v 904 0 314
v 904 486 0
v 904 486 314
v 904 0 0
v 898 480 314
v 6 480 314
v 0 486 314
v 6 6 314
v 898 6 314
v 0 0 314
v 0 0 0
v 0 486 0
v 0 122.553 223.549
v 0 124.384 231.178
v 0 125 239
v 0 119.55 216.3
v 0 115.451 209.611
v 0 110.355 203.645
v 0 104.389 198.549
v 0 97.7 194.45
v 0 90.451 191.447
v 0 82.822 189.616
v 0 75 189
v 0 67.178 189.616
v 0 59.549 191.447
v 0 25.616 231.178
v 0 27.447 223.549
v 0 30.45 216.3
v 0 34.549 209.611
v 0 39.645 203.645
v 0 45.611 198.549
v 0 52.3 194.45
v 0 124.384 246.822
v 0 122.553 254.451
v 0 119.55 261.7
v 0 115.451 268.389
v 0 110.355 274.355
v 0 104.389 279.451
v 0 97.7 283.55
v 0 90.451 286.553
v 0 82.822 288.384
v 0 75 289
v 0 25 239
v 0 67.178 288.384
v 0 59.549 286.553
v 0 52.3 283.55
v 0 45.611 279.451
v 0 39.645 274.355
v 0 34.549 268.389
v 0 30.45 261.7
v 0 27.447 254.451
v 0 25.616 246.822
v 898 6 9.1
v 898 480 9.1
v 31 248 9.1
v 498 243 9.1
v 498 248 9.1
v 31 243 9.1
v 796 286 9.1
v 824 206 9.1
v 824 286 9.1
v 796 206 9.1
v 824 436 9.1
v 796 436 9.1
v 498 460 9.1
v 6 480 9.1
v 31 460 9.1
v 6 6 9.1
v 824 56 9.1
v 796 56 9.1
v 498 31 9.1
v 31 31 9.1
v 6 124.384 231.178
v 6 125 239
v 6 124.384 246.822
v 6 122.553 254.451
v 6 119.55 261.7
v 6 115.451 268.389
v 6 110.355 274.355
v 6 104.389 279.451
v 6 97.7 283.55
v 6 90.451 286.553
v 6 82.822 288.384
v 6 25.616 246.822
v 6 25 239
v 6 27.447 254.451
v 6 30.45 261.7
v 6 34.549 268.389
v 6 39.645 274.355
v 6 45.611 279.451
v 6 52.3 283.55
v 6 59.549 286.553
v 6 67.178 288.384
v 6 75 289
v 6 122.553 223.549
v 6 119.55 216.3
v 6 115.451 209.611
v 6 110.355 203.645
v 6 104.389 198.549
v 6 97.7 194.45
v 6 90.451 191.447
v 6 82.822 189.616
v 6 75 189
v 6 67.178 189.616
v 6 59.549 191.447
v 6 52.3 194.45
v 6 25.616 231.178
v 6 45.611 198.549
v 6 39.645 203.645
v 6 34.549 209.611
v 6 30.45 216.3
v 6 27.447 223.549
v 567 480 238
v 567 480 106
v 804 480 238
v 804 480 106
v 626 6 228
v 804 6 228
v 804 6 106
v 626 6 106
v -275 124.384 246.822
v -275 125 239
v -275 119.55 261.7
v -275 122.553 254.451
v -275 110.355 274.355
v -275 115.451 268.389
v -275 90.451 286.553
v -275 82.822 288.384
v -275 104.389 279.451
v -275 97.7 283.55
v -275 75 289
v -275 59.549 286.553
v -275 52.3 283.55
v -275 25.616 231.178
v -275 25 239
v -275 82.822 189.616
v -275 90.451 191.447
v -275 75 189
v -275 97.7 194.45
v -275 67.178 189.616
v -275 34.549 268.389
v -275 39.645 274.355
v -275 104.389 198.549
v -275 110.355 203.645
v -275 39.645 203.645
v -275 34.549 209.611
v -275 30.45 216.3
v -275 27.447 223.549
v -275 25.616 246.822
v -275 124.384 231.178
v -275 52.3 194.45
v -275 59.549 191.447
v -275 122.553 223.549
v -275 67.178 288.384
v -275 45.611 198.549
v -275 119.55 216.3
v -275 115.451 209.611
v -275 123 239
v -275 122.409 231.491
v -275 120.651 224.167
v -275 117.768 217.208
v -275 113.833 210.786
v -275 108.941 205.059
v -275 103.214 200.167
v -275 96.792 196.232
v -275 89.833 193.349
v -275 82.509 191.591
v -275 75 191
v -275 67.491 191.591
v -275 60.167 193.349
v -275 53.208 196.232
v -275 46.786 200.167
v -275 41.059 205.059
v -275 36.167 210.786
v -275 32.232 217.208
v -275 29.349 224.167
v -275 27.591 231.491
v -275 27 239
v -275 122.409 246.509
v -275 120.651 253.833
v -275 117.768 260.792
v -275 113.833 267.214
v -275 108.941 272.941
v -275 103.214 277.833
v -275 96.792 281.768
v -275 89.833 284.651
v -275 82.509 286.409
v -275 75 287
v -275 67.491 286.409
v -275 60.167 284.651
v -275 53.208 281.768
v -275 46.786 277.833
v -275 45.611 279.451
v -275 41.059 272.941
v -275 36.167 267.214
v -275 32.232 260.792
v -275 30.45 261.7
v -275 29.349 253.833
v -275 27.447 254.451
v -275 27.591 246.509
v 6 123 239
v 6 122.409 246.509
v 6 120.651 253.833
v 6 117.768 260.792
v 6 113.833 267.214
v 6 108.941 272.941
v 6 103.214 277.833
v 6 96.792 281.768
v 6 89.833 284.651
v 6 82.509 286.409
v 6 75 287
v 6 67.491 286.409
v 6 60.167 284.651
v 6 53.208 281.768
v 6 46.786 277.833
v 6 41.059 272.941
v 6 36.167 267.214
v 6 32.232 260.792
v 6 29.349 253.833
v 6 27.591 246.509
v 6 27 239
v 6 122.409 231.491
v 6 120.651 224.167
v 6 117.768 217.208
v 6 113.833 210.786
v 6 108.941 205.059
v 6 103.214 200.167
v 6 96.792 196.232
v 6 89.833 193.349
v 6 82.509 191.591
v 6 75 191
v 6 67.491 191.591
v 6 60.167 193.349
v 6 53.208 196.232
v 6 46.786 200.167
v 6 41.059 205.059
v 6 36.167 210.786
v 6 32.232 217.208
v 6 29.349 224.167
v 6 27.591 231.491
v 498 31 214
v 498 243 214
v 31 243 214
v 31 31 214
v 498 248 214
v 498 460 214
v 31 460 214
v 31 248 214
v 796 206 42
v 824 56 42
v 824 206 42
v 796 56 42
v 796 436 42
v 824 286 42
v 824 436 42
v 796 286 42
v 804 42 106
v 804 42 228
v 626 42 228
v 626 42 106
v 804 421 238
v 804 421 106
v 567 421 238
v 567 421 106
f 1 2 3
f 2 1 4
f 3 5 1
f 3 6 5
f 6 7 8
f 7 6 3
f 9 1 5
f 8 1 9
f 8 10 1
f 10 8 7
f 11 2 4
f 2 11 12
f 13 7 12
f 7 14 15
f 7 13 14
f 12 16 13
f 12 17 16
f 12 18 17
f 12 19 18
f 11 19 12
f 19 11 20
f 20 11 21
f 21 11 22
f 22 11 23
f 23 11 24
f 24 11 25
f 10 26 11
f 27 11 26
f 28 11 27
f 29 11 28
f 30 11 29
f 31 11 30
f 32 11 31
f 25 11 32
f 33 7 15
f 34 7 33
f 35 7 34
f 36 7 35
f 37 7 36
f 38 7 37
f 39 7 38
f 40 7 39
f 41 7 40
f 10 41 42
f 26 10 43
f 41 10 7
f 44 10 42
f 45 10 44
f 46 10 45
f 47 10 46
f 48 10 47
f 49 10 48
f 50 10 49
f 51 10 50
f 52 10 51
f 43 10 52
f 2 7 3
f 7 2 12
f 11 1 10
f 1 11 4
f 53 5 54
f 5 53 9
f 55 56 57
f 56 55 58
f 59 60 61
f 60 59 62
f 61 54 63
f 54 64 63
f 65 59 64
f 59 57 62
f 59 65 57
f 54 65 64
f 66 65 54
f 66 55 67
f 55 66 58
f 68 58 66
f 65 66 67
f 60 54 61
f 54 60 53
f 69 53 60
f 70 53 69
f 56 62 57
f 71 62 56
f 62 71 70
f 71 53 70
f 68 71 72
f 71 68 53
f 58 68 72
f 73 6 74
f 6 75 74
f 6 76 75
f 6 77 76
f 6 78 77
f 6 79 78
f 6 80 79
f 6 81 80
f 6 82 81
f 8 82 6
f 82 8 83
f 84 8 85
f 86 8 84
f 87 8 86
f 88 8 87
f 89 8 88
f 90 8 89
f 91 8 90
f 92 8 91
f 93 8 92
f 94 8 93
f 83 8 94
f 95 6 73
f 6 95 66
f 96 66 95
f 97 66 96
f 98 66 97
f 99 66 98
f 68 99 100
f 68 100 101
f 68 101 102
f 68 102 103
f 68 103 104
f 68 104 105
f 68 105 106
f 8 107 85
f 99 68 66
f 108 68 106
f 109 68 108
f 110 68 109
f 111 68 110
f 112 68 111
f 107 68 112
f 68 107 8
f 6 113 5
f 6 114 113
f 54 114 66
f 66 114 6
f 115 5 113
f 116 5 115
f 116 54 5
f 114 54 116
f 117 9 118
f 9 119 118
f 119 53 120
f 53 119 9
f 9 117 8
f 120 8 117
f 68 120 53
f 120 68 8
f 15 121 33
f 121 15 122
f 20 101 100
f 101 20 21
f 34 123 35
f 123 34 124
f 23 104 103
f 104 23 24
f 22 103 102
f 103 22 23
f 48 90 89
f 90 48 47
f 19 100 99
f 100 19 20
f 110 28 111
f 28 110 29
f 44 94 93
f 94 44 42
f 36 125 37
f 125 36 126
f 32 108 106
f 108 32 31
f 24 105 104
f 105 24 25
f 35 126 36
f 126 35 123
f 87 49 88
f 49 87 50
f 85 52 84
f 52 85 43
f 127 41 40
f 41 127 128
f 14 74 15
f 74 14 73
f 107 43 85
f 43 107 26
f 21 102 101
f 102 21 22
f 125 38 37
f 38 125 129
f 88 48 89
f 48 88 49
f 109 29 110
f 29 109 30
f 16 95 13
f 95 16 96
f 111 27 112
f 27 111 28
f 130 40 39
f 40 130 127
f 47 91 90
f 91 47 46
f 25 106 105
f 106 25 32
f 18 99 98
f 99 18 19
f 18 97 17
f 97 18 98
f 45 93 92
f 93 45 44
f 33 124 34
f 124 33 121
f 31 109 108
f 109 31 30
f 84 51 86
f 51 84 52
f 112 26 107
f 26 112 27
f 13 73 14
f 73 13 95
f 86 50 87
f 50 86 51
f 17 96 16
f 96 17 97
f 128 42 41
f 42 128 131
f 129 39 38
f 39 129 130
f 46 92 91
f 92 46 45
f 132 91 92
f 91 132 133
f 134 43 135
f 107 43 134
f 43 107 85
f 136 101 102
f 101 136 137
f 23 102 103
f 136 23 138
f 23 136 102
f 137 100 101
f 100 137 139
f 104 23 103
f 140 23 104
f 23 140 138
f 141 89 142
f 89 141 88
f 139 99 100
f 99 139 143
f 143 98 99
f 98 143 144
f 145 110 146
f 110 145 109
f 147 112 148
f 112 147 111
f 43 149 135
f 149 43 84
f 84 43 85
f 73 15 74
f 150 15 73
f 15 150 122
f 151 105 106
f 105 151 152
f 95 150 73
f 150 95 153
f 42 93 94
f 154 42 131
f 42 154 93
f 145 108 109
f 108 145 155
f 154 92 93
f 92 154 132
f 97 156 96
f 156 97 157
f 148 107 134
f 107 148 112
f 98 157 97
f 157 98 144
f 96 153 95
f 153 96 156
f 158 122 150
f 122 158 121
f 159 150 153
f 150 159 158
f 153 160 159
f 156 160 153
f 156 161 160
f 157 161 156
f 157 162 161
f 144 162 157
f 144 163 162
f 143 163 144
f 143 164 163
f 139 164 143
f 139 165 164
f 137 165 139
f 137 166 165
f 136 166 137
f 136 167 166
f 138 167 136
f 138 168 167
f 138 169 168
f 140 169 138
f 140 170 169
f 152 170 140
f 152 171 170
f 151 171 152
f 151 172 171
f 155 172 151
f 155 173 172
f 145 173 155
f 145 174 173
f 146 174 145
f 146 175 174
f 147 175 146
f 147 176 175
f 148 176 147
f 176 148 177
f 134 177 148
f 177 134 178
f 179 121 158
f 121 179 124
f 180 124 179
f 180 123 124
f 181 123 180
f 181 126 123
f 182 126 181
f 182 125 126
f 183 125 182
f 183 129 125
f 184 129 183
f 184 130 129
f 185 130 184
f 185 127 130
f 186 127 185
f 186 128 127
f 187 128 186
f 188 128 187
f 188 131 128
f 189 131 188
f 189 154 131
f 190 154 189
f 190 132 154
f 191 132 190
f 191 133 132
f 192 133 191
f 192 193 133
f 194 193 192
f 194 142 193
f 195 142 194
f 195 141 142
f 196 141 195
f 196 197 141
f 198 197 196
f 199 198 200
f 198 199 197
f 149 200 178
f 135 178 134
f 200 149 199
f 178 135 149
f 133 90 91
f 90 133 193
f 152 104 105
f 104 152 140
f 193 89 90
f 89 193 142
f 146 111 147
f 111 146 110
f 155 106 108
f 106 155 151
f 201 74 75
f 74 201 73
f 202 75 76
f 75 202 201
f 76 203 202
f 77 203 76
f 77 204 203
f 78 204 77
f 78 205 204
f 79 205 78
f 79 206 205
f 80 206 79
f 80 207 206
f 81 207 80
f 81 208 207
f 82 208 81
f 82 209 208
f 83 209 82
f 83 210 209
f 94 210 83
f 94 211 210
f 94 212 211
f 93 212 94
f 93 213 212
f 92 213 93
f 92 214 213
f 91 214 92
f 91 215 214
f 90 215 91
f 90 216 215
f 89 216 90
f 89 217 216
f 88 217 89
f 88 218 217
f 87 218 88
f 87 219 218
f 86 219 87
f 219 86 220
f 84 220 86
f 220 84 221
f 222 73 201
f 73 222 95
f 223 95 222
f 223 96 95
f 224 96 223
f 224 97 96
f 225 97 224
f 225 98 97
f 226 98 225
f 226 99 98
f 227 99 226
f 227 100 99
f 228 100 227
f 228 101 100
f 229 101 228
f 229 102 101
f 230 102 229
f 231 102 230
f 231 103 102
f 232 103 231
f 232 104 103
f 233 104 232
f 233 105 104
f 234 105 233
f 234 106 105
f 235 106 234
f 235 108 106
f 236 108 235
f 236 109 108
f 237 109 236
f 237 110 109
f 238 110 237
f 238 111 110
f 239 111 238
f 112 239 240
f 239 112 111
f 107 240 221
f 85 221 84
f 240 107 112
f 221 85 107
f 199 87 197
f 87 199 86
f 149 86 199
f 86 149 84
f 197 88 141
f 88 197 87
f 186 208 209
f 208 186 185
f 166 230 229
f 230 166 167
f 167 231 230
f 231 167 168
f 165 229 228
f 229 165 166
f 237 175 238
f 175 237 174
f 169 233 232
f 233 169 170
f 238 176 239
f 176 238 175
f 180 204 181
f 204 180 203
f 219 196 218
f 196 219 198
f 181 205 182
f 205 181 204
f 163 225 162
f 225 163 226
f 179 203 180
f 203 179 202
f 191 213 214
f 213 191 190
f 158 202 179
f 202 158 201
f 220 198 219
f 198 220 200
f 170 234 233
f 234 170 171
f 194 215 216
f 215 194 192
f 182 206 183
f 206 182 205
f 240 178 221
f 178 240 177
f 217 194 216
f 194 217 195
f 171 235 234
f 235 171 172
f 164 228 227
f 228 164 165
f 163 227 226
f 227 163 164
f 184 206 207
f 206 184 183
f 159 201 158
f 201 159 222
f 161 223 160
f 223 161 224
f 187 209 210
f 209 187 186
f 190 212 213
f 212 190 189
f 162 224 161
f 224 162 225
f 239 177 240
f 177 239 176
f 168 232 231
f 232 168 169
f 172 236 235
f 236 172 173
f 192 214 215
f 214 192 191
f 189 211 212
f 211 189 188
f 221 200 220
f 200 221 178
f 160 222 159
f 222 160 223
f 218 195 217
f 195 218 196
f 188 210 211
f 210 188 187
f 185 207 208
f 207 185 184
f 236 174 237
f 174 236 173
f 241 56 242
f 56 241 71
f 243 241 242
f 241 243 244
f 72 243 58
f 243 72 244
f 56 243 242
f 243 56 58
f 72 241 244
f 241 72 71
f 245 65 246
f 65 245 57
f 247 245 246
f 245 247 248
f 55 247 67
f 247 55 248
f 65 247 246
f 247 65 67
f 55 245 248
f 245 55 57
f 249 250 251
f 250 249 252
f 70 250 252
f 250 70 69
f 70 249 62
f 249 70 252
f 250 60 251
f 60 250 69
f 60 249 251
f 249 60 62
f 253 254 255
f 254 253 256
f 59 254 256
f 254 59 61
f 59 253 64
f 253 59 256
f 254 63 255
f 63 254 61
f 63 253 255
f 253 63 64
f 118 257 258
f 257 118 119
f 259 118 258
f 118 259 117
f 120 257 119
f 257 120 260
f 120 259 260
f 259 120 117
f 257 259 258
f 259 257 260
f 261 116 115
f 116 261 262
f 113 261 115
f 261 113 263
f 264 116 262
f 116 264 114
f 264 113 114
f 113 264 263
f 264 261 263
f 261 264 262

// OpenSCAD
// file: functions.scad
function centre(a, b) = (a - b) / 2;

module circle3d(radius, d, colour, backgroundColour) {
	 color(colour) cylinder(h=0.1, r=radius);
	 color(backgroundColour) cylinder(h=0.2, r=radius-d);
}
	
// file: polyedge.scad
// Copyright (c) 2024 Robert Eisele ( https://raw.org ). All rights reserved.
// Licensed under the MIT license.

// https://raw.org/code/openscad-polygons-with-rounded-corners/


// Example: polyedge([ [x, y, t], ...]);
// The parameter t has the following options:
// = 0: If t is zero (or left out), the edge is becoming a normal sharp edge like in polygon()
// > 0: If t is positive, the edge will get a round corner with radius t
// < 0: If t is negative, the edge will get an inset of length -t from the original edge


function normalize (v) = v / norm(v);
function sgn(a, b) = sign(a[0] * b[1] - a[1] * b[0]);

module polyedge(pts, $fn=$fn) {

    polygon([for (L1 = [
        for (i = [1 : len(pts)])
        let(
            f = $fn == 0 ? 10 : $fn,
            A = pts[(i - 1)],
            B = pts[(i + 0) % len(pts)],
            C = pts[(i + 1) % len(pts)],

            r = B[2],
            S = [B[0], B[1]],
            a = normalize([A[0] - B[0], A[1] - B[1]]),
            b = normalize([C[0] - B[0], C[1] - B[1]]))

             (len(B) == 2 || B[2] == 0)
                ? [ S ]
                : (r < 0 
                    ? [ S - a * r, S - b * r ]
                    : [let(
                        w = r * sqrt(2 / (1 - a * b) - 1),
                        X = a * w,
                        Y = b * w,
                        M = (a + b) * (r / sqrt(1 - pow(a * b, 2))),
                        b1 = atan2(X[1] - M[1], X[0] - M[0]),
                        b2 = atan2(Y[1] - M[1], Y[0] - M[0]),
                        phi = sgn(a, b) * (sgn(a, b) * (b1 - b2) + 360) % 360,
                        segs = ceil(abs(phi) * f / 360)) 
                            for (j = [0 : segs]) 
                                B + M + [
                                    r * cos(b1 - j / segs * phi), 
                                    r * sin(b1 - j / segs * phi)]])]) for (L2 = L1) L2]); 
}
// file: appliances.scad
include <constants.scad>
include <materials.scad>
use <functions.scad>
use <polyedge.scad>

//
// Fridge
// 

// Bushman DC85-X Fridge
fridgeMain = [475, 500, 625];
fridgeDoor = [475, 50, 625];

fd = 50;
depth = [2*fd,fd,2*fd];
fridgeInternal = fridgeMain - depth;

handle = [100, 25, 50];

function fridge() = [fridgeMain[x], fridgeMain[y]+fridgeDoor[y], fridgeMain[z]];

module FridgeDoor(rightOpening) {
	if (rightOpening) {
		union() {
			color(monument)
			cube(fridgeDoor);
			translate([50,-handle[width], fridgeMain[height]-handle[height]])

			color(monument3)
			cube(handle);

			translate([0,fd,0]) color("white") cube([fridgeDoor[x],0.1,fridgeDoor[z]]);
		}
	} else {
		union() {
			color(monument)
			cube(fridgeDoor);
			translate([
				fridgeMain[width]-handle[length]-50,
				-handle[width],
				fridgeMain[height]-handle[height]
			])

			color(monument3)
			cube(handle);

			translate([0,fd,0]) color("white") cube([fridgeDoor[x],0.1,fridgeDoor[z]]);
		}
	}
		
}

module Fridge(doorOpen=false, rightOpening=true) {
	a=fridge()[length];
	difference() {
		color(monument)
		translate([0,fd,0]) cube(fridgeMain);
		translate([fd,fd-0.1,fd]) color("white") cube(fridgeInternal);
	}
	if (doorOpen) {
		if (rightOpening) {
			translate([fridgeMain[x]+fd,-fridgeDoor[x]+fd])
			rotate([0,0,90])
			FridgeDoor(rightOpening);
		} else {
			translate([-fd,fd])
			rotate([0,0,-90])
			FridgeDoor(rightOpening);
		}
	} else {
		FridgeDoor(rightOpening);		
	}

}

//
// Sink
// 
 
sinkDrain = [40,36];
drainOffset = 155;
function drainOffset() = drainOffset;

module SinkDrain() {
	color("white")
	union() {
		cylinder(d=sinkDrain[diameter], h=sinkDrain[h]);
		translate([0,sinkDrain[x],10]) rotate(x90) cylinder(d=20, h=25);
	}
}

// Dometic VA8005 / SNG4237
va8005 = [420, 370, 146.5];
va8005Cut = [405, 355, 146.5];

// Dometic VA8006 / SNG4244
va8006 = [420, 440, 146.5];
va8006Cut = [405, 425, 45];
va8006Bowl = [310,330,101];
bowlOffset = 28;

sink = va8006;
sinkCutout = va8006Cut;
bowl = va8006Bowl;

rSink = 30;
sinkPoly = [[0,0,rSink],[0,sink[y],rSink],[sink[x],sink[y],rSink],[sink[x],0,rSink]];

rCover = 70;
sinkCover = [[0,0,rCover],[0,sink[y],rCover],[sink[x],sink[y],rCover],[sink[x],0,rCover]];

bowlPoly = [[0,0,rSink],[0,bowl[y],rSink],[bowl[x],bowl[y],rSink],[bowl[x],0,rSink]];

r1=30;
r2=70;
w=sinkCutout[x];
d=sinkCutout[y];
c=75; //champfer

cutout = [[0,0,r2], [0,d-c,r1], [c,d,r1], [w-c,d,r1], [w,d-c,r1], [w,0,r2]];

function sink() = sink;

module Sink() {
	color("Silver")
	translate([0,0,sink[z]])
	union() {
		difference() {
			linear_extrude(5) polyedge(sinkPoly);
			translate([centre(sink[x], w),centre(sink[y], d),-0.1]) 
			linear_extrude(5.2)
			polyedge(cutout);
		}
		translate([
			r1+centre(sink[x], bowl[x]),
			r1+bowlOffset,
			-sink[z]
		]) {
			// Base of the bowl
			linear_extrude(1)
					offset(r=r1) {
						square(bowl[x]-2*r1,bowl[y]-2*r1);
					}
			// Bowl sides
			linear_extrude(bowl[z]) {
				difference() {
					offset(r=r1) {
						square(bowl[x]-2*r1,bowl[y]-2*r1);
					}
					offset(r=r1-0.5) {
						square(bowl[x]-2*r1,bowl[y]-2*r1);
					}
				}
			}
		}
	translate([sink[x]/2, sink[y]-drainOffset, -sink[z]-sinkDrain[h]]) SinkDrain();
	}
	// union() {
	// 	difference() {
	// 		linear_extrude(sink[height]) polyedge(sinkPoly);

	// 		translate([centre(sink[x], w),centre(sink[y], d),sink[z]-sinkCutout[z]+5]) 
	// 		linear_extrude(sinkCutout[z])
	// 		polyedge(cutout);

	// 		translate([
	// 			centre(sink[x], bowl[x]),
	// 			bowlOffset,
	// 			sink[z]-bowl[z]+5
	// 		]) 
	// 		linear_extrude(sink[z]) {
	// 			difference() {
	// 				offset(r=r1) {
	// 					square(bowl[x]-2*r1,bowl[y]-2*r1);
	// 				}
	// 				offset(r=r1) {
	// 					square(bowl[x]-2*r1,bowl[y]-2*r1);
	// 				}
	// 			}
	// 		}
	// 		polyedge(bowlPoly);
	// 	}
	// 	translate([sink[x]/2, sink[y]-155, -sinkDrain[h]]) SinkDrain();
	// }
}

module SinkCutout() {
	difference() {
		translate([centre(sink[length], w),centre(sink[width], d),-5]) linear_extrude(benchThickness+10)
		polyedge(cutout);
	}
}

module SinkCover() {
difference() {
		color(monument) linear_extrude(10) offset(delta=-10) polyedge(sinkCover);
		translate([sink[length]/2,50,-5])  cylinder(h=20, r=20);
	}
}

//
// Hob
// 
safierySingle = [276, 366, 75];
safieryDual = [290, 520, 55];
safierySingleCutout = [252, 342, benchThickness+10];
safieryDualCutout = [270, 497, benchThickness+10];

hob = safierySingle;
hobCutout = safierySingleCutout;

function hob() = hob;

module Hob(hobs) {
	color(monument)
	cube(hob);
	if (hobs == 1) {
		translate([hob[x]/2,hob[width]-30-90,hob[height]]) circle3d(90, 2, vividWhite, monument);
		translate([hob[x]/2+10,50,hob[height]]) circle3d(5, 1, vividWhite, monument);
		translate([hob[x]/2+40,50,hob[height]]) circle3d(5, 1, vividWhite, monument);
		translate([hob[x]/2+70,50,hob[height]]) circle3d(5, 1, vividWhite, monument);
	} else {
		translate([hob[x]/2,180,hob[height]]) circle3d(80, 2, vividWhite, monument);
		translate([hob[x]/2,hob[width]-30-90,hob[height]]) circle3d(90, 2, vividWhite, monument);
		translate([hob[x]/2+10,50,hob[height]]) circle3d(5, 1, vividWhite, monument);
		translate([hob[x]/2+40,50,hob[height]]) circle3d(5, 1, vividWhite, monument);
		translate([hob[x]/2+70,50,hob[height]]) circle3d(5, 1, vividWhite, monument);
	}
}

module HobCutout() {
	translate([0,0,-5]) cube(hobCutout);
}

airCompressor = [200,170,140];
function airCompressor() = airCompressor;

module AirCompressor () {
	d=90;
	union() {
		color("black") cube([airCompressor[x],airCompressor[y], 3]);
		color("blue") translate([0,d/2+10,d/2+10]) rotate(y90) cylinder(d=d, h=airCompressor[x]);
	}
}
// file: van_dimensions.scad
include <constants.scad>
use <polyedge.scad>

cladding = 3+6;

// Van Sizing
vanExternal = [5265, 1950, 1990];
vanInternal = [2700, 1760, 1340];
rearDoorWidth = 1500;
rearDoorChampfer = [55,480];

step = [1010, 215,200];
stepOffset = 130;
frontSeatOffset = 130;

doorOpening = 520;

vi = vanInternal;
r = 20;
rd = rearDoorWidth;
cx = 80; // champferS
cy = (vi[y] - rd)/2;
cl = round(sqrt(cx*cx+cy*cy));
ca = atan(cx/cy);

vanInternalPoly = [
	[0,0,r],
	[0,vi[y],r],
	[vi[x]-cx, vi[y],r],
	[vi[x], vi[y]-cy,r],
	[vi[x], cy,r],
	[vi[x]-cx, 0,r],
	];

wheelBase = 3210;
frontToWheel = 950;
rearToWheel = 1105;

// Clearance between rear door and sofa bed
rearDoorClearance = 50;
wheelArch = [840, 240, 240];
wheelArchOffset = 500;
wheelArchFront = vi[x]-wheelArchOffset-wheelArch[x];
wheelArchRear = vi[x]-wheelArchOffset;

r1 = 280;
r2 = 160;
wheelArchPoly = [[0,0,0], [0,240,r1], [840,240,r2], [840,0,0]];

module WheelArch() {
	 translate([wheelArch[x],0,0]) rotate([90,0,180]) linear_extrude(wheelArch[y]) polyedge(wheelArchPoly);
}

module VanBase() {
difference() {
	union() {
		linear_extrude(step[height]) polyedge(vanInternalPoly);
		translate([vi[x] - wheelArch[x]-wheelArchOffset,0,step[z]]) WheelArch();
		translate([vi[x] - wheelArch[x]-wheelArchOffset,vi[y]-wheelArch[y],step[z]]) WheelArch();
	}
	translate([stepOffset,-0.1,0.1]) color("green") cube(step);
	}
}

module DoorFill() {
	cube([step[x]-doorOpening, step[y],floorPly]);
}
// file: materials.scad
// Colour Scheme
vividWhite = "#f7f8f4";
whisperWhite = "#ebe9e0";
monument = "#404141";
monument3 = "#4d4e4e";

floorColour = "#6A6661";
benchColour = vividWhite;

woodColour1 = "#f7ecd9";
woodColour2 = "#f2e2c4";
woodColour3 = "#eed7af";
woodColour4 = "#e9cd9a";
woodColour5 = "#e4c385";
woodColour6 = "#e0b870";
woodColour7 = "#dbae5b";

woodColour = woodColour4;

couchCushionColour = "LightSkyBlue";

// Use Gaboon Ply - sheet size is 2400x1200
ply3= 3; // 4.5kg
ply6= 6; // 9kg
ply9= 9; // 13.4kg
ply12 = 12; // 19.9kg
ply15 = 15;
ply18 = 18; // 26.8kg

panelPly = ply3;
boxPly = ply6;
facePly = ply12;
shelfPly = ply12;

// framing timber dimensions
// 90x12
// 65x12
// 40x12
// 30x12
// 20x12

framingPly = ply12;
framingWidth = 40;

panelThickness = panelPly+framingPly;
benchThickness = ply15;

floorPly = ply9;

slatWidth = 64;
slatDepth = ply15;
slat = [64,19];

rail = [64,19];

hingeClosed = [75, 35, 3];

legWidth = 38;
// file: constants.scad
length = 0;
width = 1;
height = 2;

x = 0;
y = 1;
z = 2;

h = 0;
diameter = 1;

x90 = [90,0,0];
y90 = [0,90,0];
z90 = [0,0,90];

$dim_fontsize = 30;
$dim_linewidth = 1;
$weight = 5;

// Sets granularity of rounded polygons
$fn=40;
// file: common.scad
include <materials.scad>

//
// Open Box
// 
module OpenBox(box,openSide,colour) {

	// Wall Thickness
	wallThicknessTB = [2*boxPly,2*boxPly,boxPly];
	wallThicknessFB = [2*boxPly,boxPly,2*boxPly];
	translate(box/2)
	difference() {
		color(colour) cube(box, center=true);
		if (openSide=="top") {
			translate([0,0,boxPly+0.1]) cube(box - wallThicknessTB, center=true);
		} else if (openSide=="front") {
			translate([0,boxPly+0.1,0]) cube(box - wallThicknessFB, center=true);
		} else if (openSide=="bottom") {
			translate([0,0,-boxPly-0.1]) cube(box - wallThicknessTB, center=true);
		} else if (openSide=="back") {
			translate([0,-boxPly-0.1,0]) cube(box - wallThicknessFB, center=true);
		} else {
			translate([boxPly+0.1,0,0]) cube(box - wallThicknessFB, center=true);
		}
	}
}
// file: common_dimensions.scad
include <constants.scad>
include <materials.scad>
include <van_dimensions.scad>

use <appliances.scad>

gap = 10; // gap between appliances and panels
spacing = 2; // spacing between doors/draws and cupboard panels
lip = 10; // lip over benchtop
clearance = 50; // General clearance between things

shelfLipHeight = 75;
drawSetback = 50;
//
// Custom Tank - the width of the L shape
//
tankL = 300;

//
// Sofa Bed
//
seatHeight = 460;
baseWidth = 850;
headBoardBoxWidth = 150;

sofaBedWidth = baseWidth+headBoardBoxWidth;
sofaBedOffset = [vi[x]-sofaBedWidth,0];

//
// Kitchen cupboard width calculations based on a 50mm clearance from the end of the bench
// and the sofa which will effectively set the bench length.
//
benchHeight = 900;
benchLength = sofaBedOffset[x]-clearance-frontSeatOffset;
bench = [benchLength, fridge()[y]-50,benchHeight];

function bench() = bench;

fridgeCupboardWidth = fridge()[x]+2*gap; 

// Calculate the width of the 2x kitchen cupboards
totalCupboardsWidth = vi[x] - frontSeatOffset - panelThickness - fridgeCupboardWidth -panelThickness - sofaBedWidth - clearance - panelThickness;
kitchenCupboardWidth = floor((totalCupboardsWidth-panelThickness)/2);


//
// Panel offsets from front on front side edge of panel
//
fl = 0;
fr = 1;
km = 2;
be = 3;
wa = 4;
vr = 5;

panel1 = frontSeatOffset + panelThickness + fridgeCupboardWidth;
panel2 = panel1 + panelThickness + kitchenCupboardWidth;

panelOffset = [
	frontSeatOffset, // Fridge Left
	panel1, // Fridge Right
	panel2, // Kitchen Middle
	sofaBedOffset[x]-clearance-panelThickness, // Bench End
	wheelArchRear, // Rear of Wheel Arch
	vi[x], // Rear of Van
];

//
// Panel offsets from front on inside or back edge of panel
//
panelIdentity = [1,1,1,1,1,1];
panelInnerOffset = panelOffset + panelThickness*panelIdentity;

//
// Cupboard Internal Widths from front to back of Van
//
fridge = 0;
LHKitchen = 1;
RHKitchen = 2;
clothes = 3;
end = 4;
wtank = 5;

cupboardWidth = [
	fridgeCupboardWidth, // Fridge Cupboard
	kitchenCupboardWidth, // LH Kitchen Cupboard
	kitchenCupboardWidth, // RH Kitchen Cupboard
	panelOffset[wa]-panelInnerOffset[be], // Clothes Cupboard
	vi[x] - panelInnerOffset[wa], // End Cupboard
	panelOffset[wa]-panelInnerOffset[fr]-wheelArch[x]-tankL-2*gap-panelThickness // Water Tank Cupboard
];

//
// Kitchen Bench Height
// 

cupboard = [600, 500, vanInternal[height]];
function cupboard() = cupboard;

cupboardFace = vi[y]-cladding-cupboard[y];
// file: electrical.scad
// include <constants.scad>
// include <materials.scad>
// include <van_dimensions.scad>
include <common_dimensions.scad>

use <common.scad>

//
// Fan Extraction Duct
//
duct = [wheelArch[z]+2*gap+slatDepth+boxPly,100];
function duct() = duct;

module Duct(diameter=duct[diameter], h=duct[h]) {
	color("white")
	translate([h/2,diameter/2,diameter/2])
	rotate(y90)
	difference() {
		cylinder(d=diameter, h=h, center=true);
		cylinder(d=diameter-4, h=h+10, center=true);
	};
}

module DuctCutout(diameter=duct[diameter]) {
	translate([-1,diameter/2,diameter/2])
	rotate(y90)
	cylinder(d=diameter, h=10*boxPly+2);
}

// Position of duct on Battery Box relative to lower left corner
function ductPosition() = [0,clearance,batteryBox[z]-duct[diameter]-clearance];

//
// Bus Bar
//
busBar = [150,28,36];
function busBar() = busBar;

module BusBar(polarity) {
	colour = polarity == "+ve" ? "red" : "black";	
	color(colour) cube(busBar);
}

//
// Battery
// 
renogy100 = [268,193,205];
renogy200 = [467,212,208];

boxGap = [200,25,50];
boxPly = 6;

battery = renogy200;

function battery() = [battery];

module Battery() {
	color(monument) cube(battery);
}

//
// Battery Box
// 
clearance = 25; // clearance around duct

batteryBox = [
		battery[x]+2*boxPly+2*boxGap[x]+boxGap[y],
		2*battery[y]+2*(boxGap[y]+boxPly),
		battery[z]+2*boxGap[z]+boxPly
];

function batteryBox() = batteryBox;

module BatteryBox() {
	difference() {
		OpenBox(batteryBox(), "top", "red");
		translate(ductPosition()) DuctCutout();
	}

	// Add an extraction Fan and Duct
	translate([-duct[h]+boxPly,0])
	translate(ductPosition()) Duct();	

	translate([boxPly,boxPly,boxPly]) {
		translate([boxGap[y],boxGap[y]]) Battery();
		translate([boxGap[y],battery[y]+boxGap[y]+5,0]) Battery();
		translate([batteryBox()[x]-(boxGap[x]-busBar()[y])/2,boxGap[z],0]) rotate([0,0,90])
		BusBar("-ve");
		translate([batteryBox()[x]-(boxGap[x]-busBar()[y])/2,batteryBox()[y]-busBar()[x]-boxPly-50,0]) rotate([0,0,90])
		BusBar("+ve");
	}
	color("blue") translate([
		batteryBox[x]-dcdc("IP67")[x]-100,
		boxPly,
		boxPly+100
	])
	DcDc("IP67");	

	color("green") translate([
		batteryBox[x]-dcdc("DCDC20A")[x]-100,
		batteryBox[y]-dcdc("DCDC20A")[y]-boxPly,
		boxPly+100
	])
	DcDc("DCDC20A");	
}

//
// Inverter
// 

renogy2000WInverter = [442,220,92];
renogy3000WInverter = [482,220,92];

inverter = renogy2000WInverter;
inverterboxGap = [200,200,0];

function inverter() = inverter+inverterboxGap;
function inverterboxGap() = inverterboxGap;

module Inverter() {
	union() {
		cube([inverter[x]+inverterboxGap[x], inverter[y]+inverterboxGap[y],1]);
		translate([inverterboxGap[x]/2, inverterboxGap[y]/2, 0]) cube(inverter);
	}
}

//
// DC - DC convertor
// To be vertically mounted for air flow
// so dimensions are oriented for vertical mount
//

DCDC_20A = [237, 59, 132];
DCC50S = [244, 146, 96];
dcDc60A = [311, 175,68];

IP67_50A = [178,36, 122];
IP67_50AboxGap = [300,300,0];
DCDC_20AboxGap = [300,300,0];

function dcdc(model) = model == "IP67" ? IP67_50A : DCDC_20A;

module DcDc(model) {
	if (model=="IP67") {
		union() {
			cube(IP67_50A);
		}
	} else if (model=="DCDC20A") {
		cube(DCDC_20A);
	}
}

//
// Power Point
// 

click = [100, 30, 105];
powerPoint = click;

module PowerPoint() {
	color("white") cube(powerPoint);
}
// main file
use <electrical.scad>

/* [Battery Box Orientation] */
orientation = "long";

module __Customiser_Limit__() {}

BatteryBox(orientation);
